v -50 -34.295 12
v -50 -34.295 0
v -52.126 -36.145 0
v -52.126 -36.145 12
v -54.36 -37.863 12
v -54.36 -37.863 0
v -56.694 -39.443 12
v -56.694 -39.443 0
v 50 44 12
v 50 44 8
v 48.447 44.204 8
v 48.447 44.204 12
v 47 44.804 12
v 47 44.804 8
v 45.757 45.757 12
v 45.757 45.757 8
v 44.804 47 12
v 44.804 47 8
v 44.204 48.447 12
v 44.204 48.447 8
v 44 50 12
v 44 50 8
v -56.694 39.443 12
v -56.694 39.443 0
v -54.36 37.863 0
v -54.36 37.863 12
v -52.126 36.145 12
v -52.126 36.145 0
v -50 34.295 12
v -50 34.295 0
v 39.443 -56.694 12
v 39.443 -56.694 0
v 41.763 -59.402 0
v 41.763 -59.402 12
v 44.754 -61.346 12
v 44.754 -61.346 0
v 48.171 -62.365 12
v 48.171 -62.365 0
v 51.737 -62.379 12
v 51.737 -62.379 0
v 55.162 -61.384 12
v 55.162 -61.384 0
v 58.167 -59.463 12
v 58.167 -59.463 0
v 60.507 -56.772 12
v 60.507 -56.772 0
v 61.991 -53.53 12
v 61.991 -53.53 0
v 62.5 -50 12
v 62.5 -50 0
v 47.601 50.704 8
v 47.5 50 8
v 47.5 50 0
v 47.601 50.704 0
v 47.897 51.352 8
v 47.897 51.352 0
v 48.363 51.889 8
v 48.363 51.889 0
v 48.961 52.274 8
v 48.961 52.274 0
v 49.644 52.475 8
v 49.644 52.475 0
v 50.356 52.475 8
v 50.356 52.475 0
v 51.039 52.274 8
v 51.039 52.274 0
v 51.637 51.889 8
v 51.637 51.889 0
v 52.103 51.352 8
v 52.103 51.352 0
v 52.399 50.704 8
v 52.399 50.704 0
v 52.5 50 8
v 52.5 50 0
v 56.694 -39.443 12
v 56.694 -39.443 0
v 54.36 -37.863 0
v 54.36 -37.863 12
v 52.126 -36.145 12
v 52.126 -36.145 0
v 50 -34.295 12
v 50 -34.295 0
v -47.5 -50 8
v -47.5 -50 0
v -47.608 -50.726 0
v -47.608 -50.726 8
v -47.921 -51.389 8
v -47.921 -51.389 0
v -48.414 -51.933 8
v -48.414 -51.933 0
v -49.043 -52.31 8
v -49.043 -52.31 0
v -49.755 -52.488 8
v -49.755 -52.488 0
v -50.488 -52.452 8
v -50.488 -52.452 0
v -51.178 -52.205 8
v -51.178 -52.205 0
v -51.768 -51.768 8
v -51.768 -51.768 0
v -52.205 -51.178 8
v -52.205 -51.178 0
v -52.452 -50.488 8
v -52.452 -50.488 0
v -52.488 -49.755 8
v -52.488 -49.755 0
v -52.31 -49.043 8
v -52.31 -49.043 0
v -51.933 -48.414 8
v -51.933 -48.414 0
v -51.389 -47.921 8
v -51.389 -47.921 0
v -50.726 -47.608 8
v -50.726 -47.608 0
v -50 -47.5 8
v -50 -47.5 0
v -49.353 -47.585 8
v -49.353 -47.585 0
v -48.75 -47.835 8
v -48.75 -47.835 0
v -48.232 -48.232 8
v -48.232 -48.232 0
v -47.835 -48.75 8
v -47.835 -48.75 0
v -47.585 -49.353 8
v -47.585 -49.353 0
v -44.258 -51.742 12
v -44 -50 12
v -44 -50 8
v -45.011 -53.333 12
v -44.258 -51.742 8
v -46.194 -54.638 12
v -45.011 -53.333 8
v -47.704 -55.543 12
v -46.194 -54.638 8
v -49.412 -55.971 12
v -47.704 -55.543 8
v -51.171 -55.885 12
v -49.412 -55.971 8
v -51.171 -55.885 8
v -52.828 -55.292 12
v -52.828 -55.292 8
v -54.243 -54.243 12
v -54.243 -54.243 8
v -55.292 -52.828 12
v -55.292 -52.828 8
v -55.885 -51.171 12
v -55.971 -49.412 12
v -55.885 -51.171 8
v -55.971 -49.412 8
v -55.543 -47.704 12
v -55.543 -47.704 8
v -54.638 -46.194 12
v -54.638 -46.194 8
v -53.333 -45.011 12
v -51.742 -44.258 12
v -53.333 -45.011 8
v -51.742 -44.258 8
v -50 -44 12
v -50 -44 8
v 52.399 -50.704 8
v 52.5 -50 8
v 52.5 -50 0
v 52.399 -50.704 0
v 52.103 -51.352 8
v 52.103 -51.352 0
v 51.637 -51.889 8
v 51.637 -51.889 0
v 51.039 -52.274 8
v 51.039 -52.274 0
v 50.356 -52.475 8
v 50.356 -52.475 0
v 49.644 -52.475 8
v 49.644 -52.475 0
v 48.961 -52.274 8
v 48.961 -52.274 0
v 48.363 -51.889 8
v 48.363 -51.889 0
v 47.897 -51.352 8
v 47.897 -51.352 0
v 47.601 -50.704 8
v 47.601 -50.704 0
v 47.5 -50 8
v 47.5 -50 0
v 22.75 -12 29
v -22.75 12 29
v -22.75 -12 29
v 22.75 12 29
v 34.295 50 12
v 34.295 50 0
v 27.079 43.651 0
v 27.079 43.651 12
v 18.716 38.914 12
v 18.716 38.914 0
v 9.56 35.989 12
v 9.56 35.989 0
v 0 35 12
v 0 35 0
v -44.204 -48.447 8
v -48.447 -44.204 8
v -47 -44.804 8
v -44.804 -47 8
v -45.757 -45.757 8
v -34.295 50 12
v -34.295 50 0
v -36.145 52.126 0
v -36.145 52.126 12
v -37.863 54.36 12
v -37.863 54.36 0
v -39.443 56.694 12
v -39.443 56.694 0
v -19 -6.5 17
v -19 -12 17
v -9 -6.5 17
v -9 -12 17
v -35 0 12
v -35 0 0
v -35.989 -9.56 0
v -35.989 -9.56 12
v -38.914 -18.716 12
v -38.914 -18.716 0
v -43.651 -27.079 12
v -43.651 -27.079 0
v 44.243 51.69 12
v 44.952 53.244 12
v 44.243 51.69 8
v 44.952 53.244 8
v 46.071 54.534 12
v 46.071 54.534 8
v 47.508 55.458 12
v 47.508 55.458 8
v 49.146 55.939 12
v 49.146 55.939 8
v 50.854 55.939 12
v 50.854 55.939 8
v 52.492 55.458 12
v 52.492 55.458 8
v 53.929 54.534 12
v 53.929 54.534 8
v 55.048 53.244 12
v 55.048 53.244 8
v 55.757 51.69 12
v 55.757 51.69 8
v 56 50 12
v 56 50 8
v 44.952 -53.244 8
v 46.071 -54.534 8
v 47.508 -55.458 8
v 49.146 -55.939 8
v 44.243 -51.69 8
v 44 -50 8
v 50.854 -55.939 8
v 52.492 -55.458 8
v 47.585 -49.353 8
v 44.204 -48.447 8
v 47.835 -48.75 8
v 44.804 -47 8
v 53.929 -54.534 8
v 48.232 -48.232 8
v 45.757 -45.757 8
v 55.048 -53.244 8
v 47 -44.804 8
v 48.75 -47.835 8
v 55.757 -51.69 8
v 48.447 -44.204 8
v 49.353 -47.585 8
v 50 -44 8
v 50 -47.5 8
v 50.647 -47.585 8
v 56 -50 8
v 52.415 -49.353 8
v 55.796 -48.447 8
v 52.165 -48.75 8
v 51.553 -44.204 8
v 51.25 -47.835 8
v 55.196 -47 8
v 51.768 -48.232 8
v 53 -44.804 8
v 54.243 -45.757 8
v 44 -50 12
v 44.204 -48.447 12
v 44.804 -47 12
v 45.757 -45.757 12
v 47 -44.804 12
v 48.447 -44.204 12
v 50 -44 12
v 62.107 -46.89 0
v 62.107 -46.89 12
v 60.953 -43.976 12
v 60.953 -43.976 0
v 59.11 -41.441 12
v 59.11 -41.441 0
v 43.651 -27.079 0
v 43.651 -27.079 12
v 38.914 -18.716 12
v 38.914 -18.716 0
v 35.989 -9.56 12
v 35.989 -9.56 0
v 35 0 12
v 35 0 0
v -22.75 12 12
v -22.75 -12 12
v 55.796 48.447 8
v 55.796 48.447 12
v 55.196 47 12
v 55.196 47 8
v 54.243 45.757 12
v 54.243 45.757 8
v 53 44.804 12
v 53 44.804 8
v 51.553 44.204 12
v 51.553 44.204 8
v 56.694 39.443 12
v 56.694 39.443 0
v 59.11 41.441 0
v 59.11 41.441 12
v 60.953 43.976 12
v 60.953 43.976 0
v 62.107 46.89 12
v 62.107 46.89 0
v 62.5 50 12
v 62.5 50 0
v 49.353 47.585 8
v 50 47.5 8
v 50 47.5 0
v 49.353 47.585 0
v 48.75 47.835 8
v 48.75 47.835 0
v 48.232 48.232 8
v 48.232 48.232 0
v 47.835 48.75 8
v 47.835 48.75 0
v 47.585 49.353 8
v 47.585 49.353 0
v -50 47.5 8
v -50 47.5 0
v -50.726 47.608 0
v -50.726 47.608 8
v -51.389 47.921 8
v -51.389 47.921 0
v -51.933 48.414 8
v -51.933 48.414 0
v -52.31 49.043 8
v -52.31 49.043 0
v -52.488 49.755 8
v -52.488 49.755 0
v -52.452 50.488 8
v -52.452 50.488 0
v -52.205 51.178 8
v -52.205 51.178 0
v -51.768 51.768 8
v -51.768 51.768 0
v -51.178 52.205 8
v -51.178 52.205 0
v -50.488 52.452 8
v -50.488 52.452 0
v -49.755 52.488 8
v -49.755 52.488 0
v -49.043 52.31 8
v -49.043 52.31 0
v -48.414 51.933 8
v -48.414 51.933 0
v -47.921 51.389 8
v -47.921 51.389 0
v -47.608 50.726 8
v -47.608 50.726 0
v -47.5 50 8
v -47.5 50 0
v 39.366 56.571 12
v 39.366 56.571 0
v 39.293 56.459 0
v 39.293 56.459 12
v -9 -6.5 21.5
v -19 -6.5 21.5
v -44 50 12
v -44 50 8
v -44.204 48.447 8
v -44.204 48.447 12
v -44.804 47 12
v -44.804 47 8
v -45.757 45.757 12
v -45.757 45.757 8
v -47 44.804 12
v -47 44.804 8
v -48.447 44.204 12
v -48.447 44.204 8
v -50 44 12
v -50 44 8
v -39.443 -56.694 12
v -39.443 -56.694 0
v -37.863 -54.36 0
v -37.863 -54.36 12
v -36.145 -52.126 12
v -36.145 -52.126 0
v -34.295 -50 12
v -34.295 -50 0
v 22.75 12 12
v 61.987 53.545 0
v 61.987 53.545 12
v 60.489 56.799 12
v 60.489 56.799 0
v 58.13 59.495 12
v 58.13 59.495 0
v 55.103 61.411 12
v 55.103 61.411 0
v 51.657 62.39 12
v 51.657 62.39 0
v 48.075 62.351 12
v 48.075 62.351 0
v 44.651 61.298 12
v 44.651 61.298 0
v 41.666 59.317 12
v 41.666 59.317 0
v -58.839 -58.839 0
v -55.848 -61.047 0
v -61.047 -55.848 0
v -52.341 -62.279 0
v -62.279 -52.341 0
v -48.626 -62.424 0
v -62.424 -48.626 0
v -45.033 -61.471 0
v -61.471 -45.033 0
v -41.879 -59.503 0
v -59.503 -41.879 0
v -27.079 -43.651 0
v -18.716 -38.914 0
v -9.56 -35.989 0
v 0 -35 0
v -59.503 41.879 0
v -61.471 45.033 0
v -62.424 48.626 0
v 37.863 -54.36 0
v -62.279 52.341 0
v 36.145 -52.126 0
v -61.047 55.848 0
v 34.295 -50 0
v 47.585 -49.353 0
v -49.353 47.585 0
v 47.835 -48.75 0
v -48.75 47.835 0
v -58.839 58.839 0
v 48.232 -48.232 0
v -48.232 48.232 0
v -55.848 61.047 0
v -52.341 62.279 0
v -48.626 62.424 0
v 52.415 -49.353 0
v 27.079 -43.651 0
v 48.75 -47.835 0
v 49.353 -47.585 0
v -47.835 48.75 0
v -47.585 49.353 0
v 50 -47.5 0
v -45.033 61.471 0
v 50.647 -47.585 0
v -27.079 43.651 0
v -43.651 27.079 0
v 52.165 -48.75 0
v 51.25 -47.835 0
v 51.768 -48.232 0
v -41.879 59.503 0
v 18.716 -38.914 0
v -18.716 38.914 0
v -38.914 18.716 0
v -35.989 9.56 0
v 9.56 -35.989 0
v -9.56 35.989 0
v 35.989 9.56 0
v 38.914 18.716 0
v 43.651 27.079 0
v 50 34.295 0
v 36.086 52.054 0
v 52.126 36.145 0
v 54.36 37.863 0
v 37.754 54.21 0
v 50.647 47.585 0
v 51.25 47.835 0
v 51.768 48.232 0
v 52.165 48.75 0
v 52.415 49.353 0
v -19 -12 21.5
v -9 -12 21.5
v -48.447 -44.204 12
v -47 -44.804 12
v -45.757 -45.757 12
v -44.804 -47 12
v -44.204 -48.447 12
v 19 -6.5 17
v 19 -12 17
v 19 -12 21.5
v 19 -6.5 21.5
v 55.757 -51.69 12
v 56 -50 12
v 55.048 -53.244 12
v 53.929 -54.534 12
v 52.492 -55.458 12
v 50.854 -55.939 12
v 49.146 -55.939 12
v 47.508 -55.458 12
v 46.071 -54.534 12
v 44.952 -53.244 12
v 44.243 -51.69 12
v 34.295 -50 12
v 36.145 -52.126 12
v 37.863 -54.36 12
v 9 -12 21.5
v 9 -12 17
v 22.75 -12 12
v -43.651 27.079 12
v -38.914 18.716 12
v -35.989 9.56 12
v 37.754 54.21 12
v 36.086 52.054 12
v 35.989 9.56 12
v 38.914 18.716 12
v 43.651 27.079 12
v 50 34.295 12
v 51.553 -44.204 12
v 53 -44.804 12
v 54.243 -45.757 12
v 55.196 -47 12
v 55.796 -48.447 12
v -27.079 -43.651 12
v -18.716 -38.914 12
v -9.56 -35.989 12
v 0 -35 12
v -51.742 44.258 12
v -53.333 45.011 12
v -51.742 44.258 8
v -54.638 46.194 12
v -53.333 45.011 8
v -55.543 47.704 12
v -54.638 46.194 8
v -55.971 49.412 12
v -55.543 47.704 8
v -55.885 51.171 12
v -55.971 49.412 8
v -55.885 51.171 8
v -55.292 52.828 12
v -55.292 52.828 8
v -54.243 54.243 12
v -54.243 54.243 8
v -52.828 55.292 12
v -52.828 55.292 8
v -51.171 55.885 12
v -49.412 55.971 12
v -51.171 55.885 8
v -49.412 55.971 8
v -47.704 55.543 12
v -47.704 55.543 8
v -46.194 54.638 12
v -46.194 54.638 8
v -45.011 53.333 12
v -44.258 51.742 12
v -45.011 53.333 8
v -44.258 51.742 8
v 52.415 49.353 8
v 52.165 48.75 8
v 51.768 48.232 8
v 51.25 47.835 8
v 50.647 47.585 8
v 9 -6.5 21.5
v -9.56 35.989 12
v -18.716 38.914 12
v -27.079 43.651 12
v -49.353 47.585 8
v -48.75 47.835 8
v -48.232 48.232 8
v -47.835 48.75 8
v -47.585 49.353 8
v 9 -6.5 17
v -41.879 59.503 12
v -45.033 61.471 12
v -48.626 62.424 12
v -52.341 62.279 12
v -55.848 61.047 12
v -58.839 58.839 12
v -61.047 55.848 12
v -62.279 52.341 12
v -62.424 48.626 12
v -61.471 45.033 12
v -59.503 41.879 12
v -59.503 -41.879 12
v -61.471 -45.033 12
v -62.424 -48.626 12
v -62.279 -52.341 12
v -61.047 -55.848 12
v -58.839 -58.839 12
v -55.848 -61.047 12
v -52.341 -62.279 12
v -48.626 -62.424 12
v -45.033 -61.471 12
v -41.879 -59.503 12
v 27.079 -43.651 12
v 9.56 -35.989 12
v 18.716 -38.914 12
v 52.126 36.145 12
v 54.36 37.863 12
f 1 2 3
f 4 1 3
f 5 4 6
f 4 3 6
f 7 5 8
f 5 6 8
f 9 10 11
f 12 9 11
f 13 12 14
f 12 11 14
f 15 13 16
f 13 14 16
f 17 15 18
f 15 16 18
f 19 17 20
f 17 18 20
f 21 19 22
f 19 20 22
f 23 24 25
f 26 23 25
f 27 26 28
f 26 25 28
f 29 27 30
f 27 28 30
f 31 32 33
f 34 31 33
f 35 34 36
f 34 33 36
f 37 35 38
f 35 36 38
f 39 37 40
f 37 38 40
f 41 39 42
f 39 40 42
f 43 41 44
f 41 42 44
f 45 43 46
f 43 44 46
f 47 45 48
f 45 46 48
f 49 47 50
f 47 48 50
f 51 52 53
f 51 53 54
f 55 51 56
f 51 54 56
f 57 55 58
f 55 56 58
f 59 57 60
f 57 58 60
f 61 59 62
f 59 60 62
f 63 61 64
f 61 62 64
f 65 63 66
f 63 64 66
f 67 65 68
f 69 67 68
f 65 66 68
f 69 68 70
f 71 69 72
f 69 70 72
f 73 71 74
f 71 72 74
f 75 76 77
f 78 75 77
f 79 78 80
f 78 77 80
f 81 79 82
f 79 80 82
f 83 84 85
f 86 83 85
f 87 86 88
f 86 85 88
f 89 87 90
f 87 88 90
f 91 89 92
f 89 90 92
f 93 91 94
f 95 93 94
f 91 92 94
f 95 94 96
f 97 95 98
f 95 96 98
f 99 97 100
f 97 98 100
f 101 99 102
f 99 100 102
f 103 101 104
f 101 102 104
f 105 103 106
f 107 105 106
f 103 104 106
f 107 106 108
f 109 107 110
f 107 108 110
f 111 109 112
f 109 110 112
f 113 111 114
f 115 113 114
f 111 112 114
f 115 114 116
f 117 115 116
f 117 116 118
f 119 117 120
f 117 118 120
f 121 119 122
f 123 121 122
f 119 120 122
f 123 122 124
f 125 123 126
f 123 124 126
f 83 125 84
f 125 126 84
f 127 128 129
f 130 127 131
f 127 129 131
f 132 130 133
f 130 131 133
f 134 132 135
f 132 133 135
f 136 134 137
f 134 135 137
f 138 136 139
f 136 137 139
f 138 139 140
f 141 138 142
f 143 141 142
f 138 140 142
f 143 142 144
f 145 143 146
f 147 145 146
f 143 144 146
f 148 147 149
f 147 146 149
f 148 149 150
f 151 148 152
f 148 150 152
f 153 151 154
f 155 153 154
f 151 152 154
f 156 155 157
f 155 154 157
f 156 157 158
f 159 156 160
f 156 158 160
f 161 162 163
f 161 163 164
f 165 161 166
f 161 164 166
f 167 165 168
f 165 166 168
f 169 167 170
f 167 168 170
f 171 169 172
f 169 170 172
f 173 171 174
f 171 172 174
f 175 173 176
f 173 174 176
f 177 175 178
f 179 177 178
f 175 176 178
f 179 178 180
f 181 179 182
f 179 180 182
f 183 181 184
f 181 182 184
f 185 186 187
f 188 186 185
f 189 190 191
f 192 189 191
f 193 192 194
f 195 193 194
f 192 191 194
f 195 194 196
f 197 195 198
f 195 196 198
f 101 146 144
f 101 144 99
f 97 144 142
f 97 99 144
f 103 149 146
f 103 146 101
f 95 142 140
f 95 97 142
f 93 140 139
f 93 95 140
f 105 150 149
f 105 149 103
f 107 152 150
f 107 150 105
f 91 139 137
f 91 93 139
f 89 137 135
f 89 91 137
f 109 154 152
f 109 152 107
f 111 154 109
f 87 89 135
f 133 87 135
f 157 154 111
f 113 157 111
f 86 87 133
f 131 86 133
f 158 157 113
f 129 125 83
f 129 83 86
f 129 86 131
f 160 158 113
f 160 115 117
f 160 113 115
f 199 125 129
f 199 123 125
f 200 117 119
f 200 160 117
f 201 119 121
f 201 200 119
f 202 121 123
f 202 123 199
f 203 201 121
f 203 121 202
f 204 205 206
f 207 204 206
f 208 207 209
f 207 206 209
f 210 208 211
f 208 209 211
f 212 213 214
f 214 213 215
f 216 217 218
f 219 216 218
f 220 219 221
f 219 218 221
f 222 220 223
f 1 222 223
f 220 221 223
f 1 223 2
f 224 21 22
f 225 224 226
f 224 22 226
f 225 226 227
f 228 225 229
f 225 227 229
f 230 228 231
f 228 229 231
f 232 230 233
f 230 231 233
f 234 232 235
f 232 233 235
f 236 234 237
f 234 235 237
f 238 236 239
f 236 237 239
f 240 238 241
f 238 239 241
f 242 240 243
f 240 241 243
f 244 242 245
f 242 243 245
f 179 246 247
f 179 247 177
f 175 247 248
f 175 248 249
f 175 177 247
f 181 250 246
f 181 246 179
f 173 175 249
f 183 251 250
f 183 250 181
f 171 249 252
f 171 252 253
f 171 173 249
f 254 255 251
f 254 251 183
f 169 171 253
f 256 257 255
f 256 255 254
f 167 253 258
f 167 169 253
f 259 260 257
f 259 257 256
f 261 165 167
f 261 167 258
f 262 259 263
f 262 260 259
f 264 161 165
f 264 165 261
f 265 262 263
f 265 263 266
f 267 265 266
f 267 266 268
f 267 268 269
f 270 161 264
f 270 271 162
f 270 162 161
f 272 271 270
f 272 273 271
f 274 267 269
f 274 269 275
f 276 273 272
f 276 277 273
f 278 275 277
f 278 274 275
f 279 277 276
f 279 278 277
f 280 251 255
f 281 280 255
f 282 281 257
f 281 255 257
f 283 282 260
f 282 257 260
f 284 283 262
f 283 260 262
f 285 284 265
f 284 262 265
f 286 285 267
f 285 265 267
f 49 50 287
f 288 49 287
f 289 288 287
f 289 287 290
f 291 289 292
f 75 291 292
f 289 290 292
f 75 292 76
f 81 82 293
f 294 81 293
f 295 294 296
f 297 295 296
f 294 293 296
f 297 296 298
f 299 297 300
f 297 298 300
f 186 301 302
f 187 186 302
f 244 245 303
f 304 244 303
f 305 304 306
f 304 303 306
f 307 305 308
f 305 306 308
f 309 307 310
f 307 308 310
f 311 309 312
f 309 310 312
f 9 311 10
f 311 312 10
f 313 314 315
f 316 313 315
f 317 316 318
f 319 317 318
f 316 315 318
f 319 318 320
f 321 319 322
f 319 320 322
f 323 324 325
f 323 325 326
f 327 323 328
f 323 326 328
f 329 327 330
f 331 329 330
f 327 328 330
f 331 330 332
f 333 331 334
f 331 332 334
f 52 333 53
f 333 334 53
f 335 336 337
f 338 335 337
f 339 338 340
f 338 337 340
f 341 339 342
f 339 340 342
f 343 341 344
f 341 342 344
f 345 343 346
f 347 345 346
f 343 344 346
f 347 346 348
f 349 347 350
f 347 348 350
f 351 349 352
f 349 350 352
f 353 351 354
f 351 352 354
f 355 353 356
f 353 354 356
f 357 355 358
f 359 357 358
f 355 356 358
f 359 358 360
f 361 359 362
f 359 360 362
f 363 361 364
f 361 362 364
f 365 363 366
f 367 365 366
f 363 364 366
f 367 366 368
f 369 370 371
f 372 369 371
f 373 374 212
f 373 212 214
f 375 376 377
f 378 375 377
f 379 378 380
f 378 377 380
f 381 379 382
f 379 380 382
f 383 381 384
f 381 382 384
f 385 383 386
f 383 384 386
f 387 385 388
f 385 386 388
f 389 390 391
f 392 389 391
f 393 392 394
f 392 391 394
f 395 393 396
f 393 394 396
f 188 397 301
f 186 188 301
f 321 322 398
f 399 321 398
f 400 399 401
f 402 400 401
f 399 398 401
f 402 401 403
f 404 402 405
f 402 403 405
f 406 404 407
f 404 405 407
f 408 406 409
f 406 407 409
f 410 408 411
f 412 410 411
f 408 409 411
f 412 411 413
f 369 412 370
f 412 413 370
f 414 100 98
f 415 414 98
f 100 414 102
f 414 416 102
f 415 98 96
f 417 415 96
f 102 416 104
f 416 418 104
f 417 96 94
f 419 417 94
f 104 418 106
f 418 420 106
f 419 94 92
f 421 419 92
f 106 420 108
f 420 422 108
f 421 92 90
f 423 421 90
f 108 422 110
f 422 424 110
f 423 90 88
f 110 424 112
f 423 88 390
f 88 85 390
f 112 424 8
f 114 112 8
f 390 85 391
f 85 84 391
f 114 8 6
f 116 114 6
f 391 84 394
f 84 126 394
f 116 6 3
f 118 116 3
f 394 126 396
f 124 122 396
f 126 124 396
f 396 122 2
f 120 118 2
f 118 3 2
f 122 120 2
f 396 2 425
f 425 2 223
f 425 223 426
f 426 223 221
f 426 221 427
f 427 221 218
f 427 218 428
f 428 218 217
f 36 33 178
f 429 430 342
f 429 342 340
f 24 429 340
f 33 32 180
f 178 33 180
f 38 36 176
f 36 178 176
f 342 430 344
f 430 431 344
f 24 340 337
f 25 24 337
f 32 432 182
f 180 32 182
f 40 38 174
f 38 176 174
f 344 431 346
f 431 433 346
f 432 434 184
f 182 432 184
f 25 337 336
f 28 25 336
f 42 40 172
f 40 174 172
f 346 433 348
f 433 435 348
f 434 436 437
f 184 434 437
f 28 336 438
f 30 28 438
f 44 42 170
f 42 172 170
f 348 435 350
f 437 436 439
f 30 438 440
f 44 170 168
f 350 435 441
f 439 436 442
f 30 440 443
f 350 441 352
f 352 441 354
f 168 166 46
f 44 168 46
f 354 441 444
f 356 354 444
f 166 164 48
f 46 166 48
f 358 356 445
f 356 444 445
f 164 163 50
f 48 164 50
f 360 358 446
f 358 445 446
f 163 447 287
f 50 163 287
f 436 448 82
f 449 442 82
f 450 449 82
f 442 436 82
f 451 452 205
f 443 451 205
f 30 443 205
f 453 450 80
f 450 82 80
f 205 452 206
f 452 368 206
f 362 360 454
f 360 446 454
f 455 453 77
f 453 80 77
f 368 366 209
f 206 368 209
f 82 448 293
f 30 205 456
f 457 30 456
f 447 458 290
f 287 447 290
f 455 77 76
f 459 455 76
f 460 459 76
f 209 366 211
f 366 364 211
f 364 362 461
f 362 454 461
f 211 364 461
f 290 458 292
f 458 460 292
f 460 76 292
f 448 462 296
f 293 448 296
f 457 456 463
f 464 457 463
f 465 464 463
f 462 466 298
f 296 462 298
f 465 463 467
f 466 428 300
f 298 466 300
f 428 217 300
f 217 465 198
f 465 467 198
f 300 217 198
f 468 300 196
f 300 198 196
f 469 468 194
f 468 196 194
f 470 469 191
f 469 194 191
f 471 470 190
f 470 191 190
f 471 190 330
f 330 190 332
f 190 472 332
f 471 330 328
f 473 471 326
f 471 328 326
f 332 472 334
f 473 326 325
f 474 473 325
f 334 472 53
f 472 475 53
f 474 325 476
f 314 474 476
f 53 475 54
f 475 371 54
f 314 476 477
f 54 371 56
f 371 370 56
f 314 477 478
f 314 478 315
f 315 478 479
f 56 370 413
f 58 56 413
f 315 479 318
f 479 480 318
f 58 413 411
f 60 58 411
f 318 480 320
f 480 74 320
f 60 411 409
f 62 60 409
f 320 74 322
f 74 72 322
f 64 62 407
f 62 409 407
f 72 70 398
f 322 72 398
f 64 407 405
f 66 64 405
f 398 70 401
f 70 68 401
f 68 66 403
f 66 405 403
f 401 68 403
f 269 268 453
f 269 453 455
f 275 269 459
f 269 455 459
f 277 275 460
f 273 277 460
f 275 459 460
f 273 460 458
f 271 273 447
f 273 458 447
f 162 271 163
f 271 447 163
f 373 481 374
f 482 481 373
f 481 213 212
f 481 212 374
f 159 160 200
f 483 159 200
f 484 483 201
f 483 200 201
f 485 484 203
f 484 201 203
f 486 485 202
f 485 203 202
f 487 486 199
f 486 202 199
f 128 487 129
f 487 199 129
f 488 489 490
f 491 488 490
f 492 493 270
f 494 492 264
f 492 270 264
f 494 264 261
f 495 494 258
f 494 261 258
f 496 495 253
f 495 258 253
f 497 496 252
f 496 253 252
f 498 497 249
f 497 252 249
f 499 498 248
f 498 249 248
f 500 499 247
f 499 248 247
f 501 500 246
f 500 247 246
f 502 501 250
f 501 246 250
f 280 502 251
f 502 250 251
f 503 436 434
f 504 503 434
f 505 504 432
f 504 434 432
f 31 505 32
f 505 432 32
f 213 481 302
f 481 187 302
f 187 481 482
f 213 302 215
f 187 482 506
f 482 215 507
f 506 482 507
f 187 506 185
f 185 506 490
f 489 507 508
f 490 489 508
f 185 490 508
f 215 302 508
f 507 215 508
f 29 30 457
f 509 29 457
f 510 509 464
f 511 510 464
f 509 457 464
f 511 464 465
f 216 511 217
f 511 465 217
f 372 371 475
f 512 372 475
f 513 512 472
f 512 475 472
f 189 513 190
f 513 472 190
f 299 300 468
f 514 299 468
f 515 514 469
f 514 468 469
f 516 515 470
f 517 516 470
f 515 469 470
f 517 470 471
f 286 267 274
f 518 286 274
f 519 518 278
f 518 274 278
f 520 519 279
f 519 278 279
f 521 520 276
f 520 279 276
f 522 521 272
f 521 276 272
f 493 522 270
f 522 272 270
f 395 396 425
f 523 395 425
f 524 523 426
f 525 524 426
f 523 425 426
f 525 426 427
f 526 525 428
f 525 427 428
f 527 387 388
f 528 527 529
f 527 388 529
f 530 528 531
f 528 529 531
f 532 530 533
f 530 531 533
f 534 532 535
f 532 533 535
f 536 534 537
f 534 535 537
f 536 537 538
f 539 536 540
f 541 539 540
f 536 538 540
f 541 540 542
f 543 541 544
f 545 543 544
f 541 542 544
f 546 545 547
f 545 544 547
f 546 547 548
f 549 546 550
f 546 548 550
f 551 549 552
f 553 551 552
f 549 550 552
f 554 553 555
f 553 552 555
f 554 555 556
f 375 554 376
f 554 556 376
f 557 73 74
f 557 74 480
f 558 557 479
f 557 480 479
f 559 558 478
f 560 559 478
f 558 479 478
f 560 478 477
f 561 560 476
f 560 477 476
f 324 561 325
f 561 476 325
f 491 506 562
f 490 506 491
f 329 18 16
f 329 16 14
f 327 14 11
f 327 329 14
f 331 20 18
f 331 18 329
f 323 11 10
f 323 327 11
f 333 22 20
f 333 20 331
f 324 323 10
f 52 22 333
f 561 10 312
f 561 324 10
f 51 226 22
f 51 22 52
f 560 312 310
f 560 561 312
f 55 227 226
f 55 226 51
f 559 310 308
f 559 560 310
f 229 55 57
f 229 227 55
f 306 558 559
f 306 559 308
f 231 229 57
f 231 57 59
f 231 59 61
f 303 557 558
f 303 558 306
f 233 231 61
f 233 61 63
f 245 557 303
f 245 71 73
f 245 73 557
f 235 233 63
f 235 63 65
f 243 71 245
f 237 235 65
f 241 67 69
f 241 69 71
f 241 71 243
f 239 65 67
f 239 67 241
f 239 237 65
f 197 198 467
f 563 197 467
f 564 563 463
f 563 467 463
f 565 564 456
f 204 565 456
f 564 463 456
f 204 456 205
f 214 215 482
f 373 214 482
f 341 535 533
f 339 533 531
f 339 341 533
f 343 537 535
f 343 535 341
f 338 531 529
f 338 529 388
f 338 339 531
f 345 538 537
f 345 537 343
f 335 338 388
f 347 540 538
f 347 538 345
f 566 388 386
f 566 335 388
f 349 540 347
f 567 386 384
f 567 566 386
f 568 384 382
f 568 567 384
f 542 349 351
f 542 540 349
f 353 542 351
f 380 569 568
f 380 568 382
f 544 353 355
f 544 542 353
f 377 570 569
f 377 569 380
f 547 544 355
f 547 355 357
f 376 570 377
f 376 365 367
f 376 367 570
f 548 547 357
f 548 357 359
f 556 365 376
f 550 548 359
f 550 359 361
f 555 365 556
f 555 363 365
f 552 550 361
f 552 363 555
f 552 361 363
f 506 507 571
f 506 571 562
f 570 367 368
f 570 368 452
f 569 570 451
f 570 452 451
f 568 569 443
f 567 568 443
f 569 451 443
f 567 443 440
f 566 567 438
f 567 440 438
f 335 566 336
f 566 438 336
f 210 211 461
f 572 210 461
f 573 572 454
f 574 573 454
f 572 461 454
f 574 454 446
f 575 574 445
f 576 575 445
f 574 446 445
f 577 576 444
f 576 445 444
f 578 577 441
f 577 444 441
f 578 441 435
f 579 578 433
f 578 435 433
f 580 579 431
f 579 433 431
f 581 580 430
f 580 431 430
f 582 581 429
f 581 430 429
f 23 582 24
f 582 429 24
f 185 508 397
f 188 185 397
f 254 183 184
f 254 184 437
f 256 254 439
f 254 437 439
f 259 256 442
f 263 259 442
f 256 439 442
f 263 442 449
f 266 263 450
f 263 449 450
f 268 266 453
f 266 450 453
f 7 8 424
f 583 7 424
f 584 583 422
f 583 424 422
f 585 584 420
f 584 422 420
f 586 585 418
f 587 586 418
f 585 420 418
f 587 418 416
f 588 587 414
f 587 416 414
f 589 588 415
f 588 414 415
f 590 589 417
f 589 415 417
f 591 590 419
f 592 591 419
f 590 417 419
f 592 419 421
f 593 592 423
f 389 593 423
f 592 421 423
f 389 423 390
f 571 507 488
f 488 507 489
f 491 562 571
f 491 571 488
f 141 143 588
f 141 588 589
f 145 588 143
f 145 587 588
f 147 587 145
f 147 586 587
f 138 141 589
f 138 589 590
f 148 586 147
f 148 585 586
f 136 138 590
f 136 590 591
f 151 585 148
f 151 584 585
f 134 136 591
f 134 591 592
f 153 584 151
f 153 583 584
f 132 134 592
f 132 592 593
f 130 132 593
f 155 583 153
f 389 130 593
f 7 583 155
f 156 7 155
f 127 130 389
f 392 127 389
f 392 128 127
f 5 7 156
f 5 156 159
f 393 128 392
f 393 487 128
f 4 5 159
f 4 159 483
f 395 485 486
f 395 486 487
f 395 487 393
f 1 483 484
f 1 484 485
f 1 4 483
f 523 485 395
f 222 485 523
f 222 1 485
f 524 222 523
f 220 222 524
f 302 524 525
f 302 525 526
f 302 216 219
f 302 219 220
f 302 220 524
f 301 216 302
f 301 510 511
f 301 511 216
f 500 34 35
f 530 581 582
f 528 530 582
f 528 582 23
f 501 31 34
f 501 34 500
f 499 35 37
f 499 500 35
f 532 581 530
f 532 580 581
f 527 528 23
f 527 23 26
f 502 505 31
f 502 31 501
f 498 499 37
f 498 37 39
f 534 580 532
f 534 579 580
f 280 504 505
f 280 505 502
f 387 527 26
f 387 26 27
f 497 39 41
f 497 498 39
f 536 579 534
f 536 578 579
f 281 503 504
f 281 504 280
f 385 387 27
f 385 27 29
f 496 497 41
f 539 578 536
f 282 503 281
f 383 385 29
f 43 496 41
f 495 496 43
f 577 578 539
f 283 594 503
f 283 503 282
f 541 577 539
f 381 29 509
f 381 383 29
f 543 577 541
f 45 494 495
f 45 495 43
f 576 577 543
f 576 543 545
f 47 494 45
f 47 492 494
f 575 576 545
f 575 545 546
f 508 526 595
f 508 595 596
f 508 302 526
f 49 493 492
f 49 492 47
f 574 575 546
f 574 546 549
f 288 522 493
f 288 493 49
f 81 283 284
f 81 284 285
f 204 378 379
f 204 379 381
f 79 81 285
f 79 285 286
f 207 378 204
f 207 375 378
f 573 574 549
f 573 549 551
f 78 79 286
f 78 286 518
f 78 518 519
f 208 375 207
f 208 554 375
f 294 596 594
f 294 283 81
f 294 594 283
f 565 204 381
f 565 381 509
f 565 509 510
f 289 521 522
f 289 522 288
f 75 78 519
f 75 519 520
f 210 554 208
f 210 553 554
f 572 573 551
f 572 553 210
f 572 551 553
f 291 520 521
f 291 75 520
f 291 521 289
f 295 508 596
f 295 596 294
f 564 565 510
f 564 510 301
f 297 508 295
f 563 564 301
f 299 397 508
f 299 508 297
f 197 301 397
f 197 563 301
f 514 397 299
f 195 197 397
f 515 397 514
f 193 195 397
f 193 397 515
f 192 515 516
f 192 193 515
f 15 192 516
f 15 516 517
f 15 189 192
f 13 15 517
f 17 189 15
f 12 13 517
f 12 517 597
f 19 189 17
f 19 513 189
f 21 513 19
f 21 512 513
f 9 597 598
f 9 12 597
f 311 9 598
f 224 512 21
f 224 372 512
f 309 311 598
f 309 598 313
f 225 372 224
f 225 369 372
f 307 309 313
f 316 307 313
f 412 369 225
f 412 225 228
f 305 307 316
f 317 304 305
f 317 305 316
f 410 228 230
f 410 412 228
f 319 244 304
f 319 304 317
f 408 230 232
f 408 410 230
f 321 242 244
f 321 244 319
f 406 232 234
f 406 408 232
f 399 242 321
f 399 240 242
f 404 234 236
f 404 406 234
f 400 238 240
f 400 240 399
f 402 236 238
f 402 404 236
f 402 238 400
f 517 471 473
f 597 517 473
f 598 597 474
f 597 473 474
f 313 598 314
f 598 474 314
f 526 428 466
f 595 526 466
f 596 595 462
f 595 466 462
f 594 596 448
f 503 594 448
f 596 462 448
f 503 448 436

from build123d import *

# Parameters (mm, degrees)
F1_DEPTH = 12
F0_W     = 22.75
F0_H     = 12
F2_DEPTH = 29
F3_DEPTH = 8
F4_W     = 10
F4_H     = 4.5
F5_DEPTH = 5.5


with BuildPart() as f1:
    # F0 (on Top) → F1 (new body)
    with BuildSketch(Plane.XY):
        with BuildLine():
            Line((37.5, -50), (34.2948445635, -50))
            ThreePointArc((34.2948445635, -50), (37.0207144417, -53.2303243355), (39.4433779545, -56.6938577061))
            ThreePointArc((39.4433779545, -56.6938577061), (37.9956721228, -53.4851272883), (37.5, -50))
        make_face()
        with BuildLine():
            Line((-34.2948445635, -50), (-37.5, -50))
            ThreePointArc((-37.5, -50), (-37.9956721876, -53.4851275115), (-39.4433782034, -56.6938580986))
            ThreePointArc((-39.4433782034, -56.6938580986), (-37.0207145834, -53.2303245197), (-34.2948445635, -50))
        make_face()
        with BuildLine():
            ThreePointArc((-39.443378119, 56.6938579655), (-37.9956721656, 53.4851274358), (-37.5, 50))
            Line((-37.5, 50), (-34.2948445635, 50))
            ThreePointArc((-34.2948445635, 50), (-37.0207145354, 53.2303244572), (-39.443378119, 56.6938579655))
        make_face()
        with BuildLine():
            Line((50, -34.2948445635), (50, -37.5))
            ThreePointArc((50, -37.5), (53.4851274351, -37.9956721654), (56.6938579643, -39.4433781183))
            ThreePointArc((56.6938579643, -39.4433781183), (53.2303244566, -37.020714535), (50, -34.2948445635))
        make_face()
        with BuildLine():
            Line((50, 37.5), (50, 34.2948445635))
            ThreePointArc((50, 34.2948445635), (53.2303242081, 37.0207143438), (56.6938574347, 39.4433777825))
            ThreePointArc((56.6938574347, 39.4433777825), (53.485127134, 37.995672078), (50, 37.5))
        make_face()
        with BuildLine():
            ThreePointArc((-56.6938576889, -39.4433779436), (-53.4851272786, -37.9956721199), (-50, -37.5))
            Line((-50, -37.5), (-50, -34.2948445635))
            ThreePointArc((-50, -34.2948445635), (-53.2303243274, -37.0207144356), (-56.6938576889, -39.4433779436))
        make_face()
        with BuildLine():
            ThreePointArc((-56.6938579169, 39.4433780882), (-53.2303244344, 37.0207145179), (-50, 34.2948445635))
            Line((-50, 34.2948445635), (-50, 37.5))
            ThreePointArc((-50, 37.5), (-53.4851274082, 37.9956721576), (-56.6938579169, 39.4433780882))
        make_face()
        with BuildLine():
            ThreePointArc((37.5, 50), (41.1611652352, 41.1611652352), (50, 37.5))
            Line((50, 37.5), (50, 44))
            ThreePointArc((50, 44), (45.7573593129, 45.7573593129), (44, 50))
            Line((44, 50), (37.5, 50))
        make_face()
        with BuildLine():
            Line((50, 44), (50, 37.5))
            ThreePointArc((50, 37.5), (53.485127134, 37.995672078), (56.6938574347, 39.4433777825))
            ThreePointArc((56.6938574347, 39.4433777825), (60.952698707, 43.9760153525), (62.5, 50))
            ThreePointArc((62.5, 50), (53.4152371074, 62.0243983426), (39.3662151199, 56.5705874261))
            ThreePointArc((39.3662151199, 56.5705874261), (37.9756016574, 53.4152371074), (37.5, 50))
            Line((37.5, 50), (44, 50))
            ThreePointArc((44, 50), (50, 56), (56, 50))
            ThreePointArc((56, 50), (54.2426406871, 45.7573593129), (50, 44))
        make_face()
        with BuildLine():
            Line((44, -50), (37.5, -50))
            ThreePointArc((37.5, -50), (37.9956721228, -53.4851272883), (39.4433779545, -56.6938577061))
            ThreePointArc((39.4433779545, -56.6938577061), (53.4851272883, -62.0043278772), (62.5, -50))
            ThreePointArc((62.5, -50), (60.9526988581, -43.9760156272), (56.6938579643, -39.4433781183))
            ThreePointArc((56.6938579643, -39.4433781183), (53.4851274351, -37.9956721654), (50, -37.5))
            Line((50, -37.5), (50, -44))
            ThreePointArc((50, -44), (54.2426406871, -45.7573593129), (56, -50))
            ThreePointArc((56, -50), (50, -56), (44, -50))
        make_face()
        with BuildLine():
            ThreePointArc((-39.4433782034, -56.6938580986), (-37.9956721876, -53.4851275115), (-37.5, -50))
            Line((-37.5, -50), (-44, -50))
            ThreePointArc((-44, -50), (-54.2426406871, -54.2426406871), (-50, -44))
            Line((-50, -44), (-50, -37.5))
            ThreePointArc((-50, -37.5), (-53.4851272786, -37.9956721199), (-56.6938576889, -39.4433779436))
            ThreePointArc((-56.6938576889, -39.4433779436), (-58.8388349363, -58.8388345933), (-39.4433782034, -56.6938580986))
        make_face()
        with BuildLine():
            ThreePointArc((-56.6938579169, 39.4433780882), (-53.4851274082, 37.9956721576), (-50, 37.5))
            Line((-50, 37.5), (-50, 44))
            ThreePointArc((-50, 44), (-54.2426406871, 54.2426406871), (-44, 50))
            Line((-44, 50), (-37.5, 50))
            ThreePointArc((-37.5, 50), (-37.9956721656, 53.4851274358), (-39.443378119, 56.6938579655))
            ThreePointArc((-39.443378119, 56.6938579655), (-58.8388347851, 58.8388347445), (-56.6938579169, 39.4433780882))
        make_face()
        with BuildLine():
            Line((22.75, 12), (22.75, 0))
            Line((22.75, 0), (35, 0))
            ThreePointArc((35, 0), (38.9140035649, 18.7158780427), (50, 34.2948445635))
            Line((50, 34.2948445635), (50, 37.5))
            ThreePointArc((50, 37.5), (41.1611652352, 41.1611652352), (37.5, 50))
            Line((37.5, 50), (34.2948445635, 50))
            ThreePointArc((34.2948445635, 50), (18.7158780427, 38.9140035649), (0, 35))
            Line((0, 35), (0, 12))
            Line((0, 12), (22.75, 12))
        make_face()
        with BuildLine():
            ThreePointArc((0, -35), (18.7158780427, -38.9140035649), (34.2948445635, -50))
            Line((34.2948445635, -50), (37.5, -50))
            ThreePointArc((37.5, -50), (41.1611652352, -41.1611652352), (50, -37.5))
            Line((50, -37.5), (50, -34.2948445635))
            ThreePointArc((50, -34.2948445635), (38.9140035649, -18.7158780427), (35, 0))
            Line((35, 0), (22.75, 0))
            Line((22.75, 0), (22.75, -12))
            Line((22.75, -12), (0, -12))
            Line((0, -12), (0, -35))
        make_face()
        with BuildLine():
            ThreePointArc((-50, -37.5), (-41.1611652352, -41.1611652352), (-37.5, -50))
            Line((-37.5, -50), (-34.2948445635, -50))
            ThreePointArc((-34.2948445635, -50), (-18.7158780427, -38.9140035649), (0, -35))
            Line((0, -35), (0, -12))
            Line((0, -12), (-22.75, -12))
            Line((-22.75, -12), (-22.75, 0))
            Line((-22.75, 0), (-35, 0))
            ThreePointArc((-35, 0), (-38.9140035649, -18.7158780427), (-50, -34.2948445635))
            Line((-50, -34.2948445635), (-50, -37.5))
        make_face()
        with BuildLine():
            Line((-50, 37.5), (-50, 34.2948445635))
            ThreePointArc((-50, 34.2948445635), (-38.9140035649, 18.7158780427), (-35, 0))
            Line((-35, 0), (-22.75, 0))
            Line((-22.75, 0), (-22.75, 12))
            Line((-22.75, 12), (0, 12))
            Line((0, 12), (0, 35))
            ThreePointArc((0, 35), (-18.7158780427, 38.9140035649), (-34.2948445635, 50))
            Line((-34.2948445635, 50), (-37.5, 50))
            ThreePointArc((-37.5, 50), (-41.1611652352, 41.1611652352), (-50, 37.5))
        make_face()
        with BuildLine():
            Line((-44, -50), (-37.5, -50))
            ThreePointArc((-37.5, -50), (-41.1611652352, -41.1611652352), (-50, -37.5))
            Line((-50, -37.5), (-50, -44))
            ThreePointArc((-50, -44), (-45.7573593129, -45.7573593129), (-44, -50))
        make_face()
        with BuildLine():
            Line((-50, 44), (-50, 37.5))
            ThreePointArc((-50, 37.5), (-41.1611652352, 41.1611652352), (-37.5, 50))
            Line((-37.5, 50), (-44, 50))
            ThreePointArc((-44, 50), (-45.7573593129, 45.7573593129), (-50, 44))
        make_face()
        with BuildLine():
            ThreePointArc((50, -37.5), (41.1611652352, -41.1611652352), (37.5, -50))
            Line((37.5, -50), (44, -50))
            ThreePointArc((44, -50), (45.7573593129, -45.7573593129), (50, -44))
            Line((50, -44), (50, -37.5))
        make_face()
        with BuildLine():
            ThreePointArc((39.2932775844, 56.4586962355), (36.935506218, 53.1198826695), (34.2948445635, 50))
            Line((34.2948445635, 50), (37.5, 50))
            ThreePointArc((37.5, 50), (37.9756016574, 53.4152371074), (39.3662151199, 56.5705874261))
            Line((39.3662151199, 56.5705874261), (39.2932775844, 56.4586962355))
        make_face()
    extrude(amount=F1_DEPTH)

    # F0 (on Top) → F2 (join)
    with BuildSketch(Plane.XY):
        with Locations((-11.375, 6)):
            Rectangle(F0_W, F0_H)
        with Locations((11.375, 6)):
            Rectangle(F0_W, F0_H)
        with Locations((11.375, -6)):
            Rectangle(F0_W, F0_H)
        with Locations((-11.375, -6)):
            Rectangle(F0_W, F0_H)
    extrude(amount=F2_DEPTH)

    # F0 (on Top) → F3 (join)
    with BuildSketch(Plane.XY):
        with BuildLine():
            ThreePointArc((-44, 50), (-54.2426406871, 54.2426406871), (-50, 44))
            Line((-50, 44), (-50, 47.5))
            ThreePointArc((-50, 47.5), (-51.767766953, 51.767766953), (-47.5, 50))
            Line((-47.5, 50), (-44, 50))
        make_face()
        with BuildLine():
            Line((-50, 47.5), (-50, 44))
            ThreePointArc((-50, 44), (-45.7573593129, 45.7573593129), (-44, 50))
            Line((-44, 50), (-47.5, 50))
            ThreePointArc((-47.5, 50), (-48.232233047, 48.232233047), (-50, 47.5))
        make_face()
        with BuildLine():
            Line((50, 47.5), (50, 44))
            ThreePointArc((50, 44), (54.2426406871, 45.7573593129), (56, 50))
            ThreePointArc((56, 50), (50, 56), (44, 50))
            Line((44, 50), (47.5, 50))
            ThreePointArc((47.5, 50), (50, 52.5), (52.5, 50))
            ThreePointArc((52.5, 50), (51.767766953, 48.232233047), (50, 47.5))
        make_face()
        with BuildLine():
            ThreePointArc((44, 50), (45.7573593129, 45.7573593129), (50, 44))
            Line((50, 44), (50, 47.5))
            ThreePointArc((50, 47.5), (48.232233047, 48.232233047), (47.5, 50))
            Line((47.5, 50), (44, 50))
        make_face()
        with BuildLine():
            ThreePointArc((50, -44), (45.7573593129, -45.7573593129), (44, -50))
            Line((44, -50), (47.5, -50))
            ThreePointArc((47.5, -50), (48.232233047, -48.232233047), (50, -47.5))
            Line((50, -47.5), (50, -44))
        make_face()
        with BuildLine():
            Line((47.5, -50), (44, -50))
            ThreePointArc((44, -50), (50, -56), (56, -50))
            ThreePointArc((56, -50), (54.2426406871, -45.7573593129), (50, -44))
            Line((50, -44), (50, -47.5))
            ThreePointArc((50, -47.5), (51.767766953, -48.232233047), (52.5, -50))
            ThreePointArc((52.5, -50), (50, -52.5), (47.5, -50))
        make_face()
        with BuildLine():
            Line((-47.5, -50), (-44, -50))
            ThreePointArc((-44, -50), (-45.7573593129, -45.7573593129), (-50, -44))
            Line((-50, -44), (-50, -47.5))
            ThreePointArc((-50, -47.5), (-48.232233047, -48.232233047), (-47.5, -50))
        make_face()
        with BuildLine():
            ThreePointArc((-50, -44), (-54.2426406871, -54.2426406871), (-44, -50))
            Line((-44, -50), (-47.5, -50))
            ThreePointArc((-47.5, -50), (-51.767766953, -51.767766953), (-50, -47.5))
            Line((-50, -47.5), (-50, -44))
        make_face()
    extrude(amount=F3_DEPTH)

    # F4 (on face) → F5 (cut)
    with BuildSketch(Plane.XZ.offset(12)):
        with Locations((-14, 19.25)):
            Rectangle(F4_W, F4_H)
        with Locations((14, 19.25)):
            Rectangle(F4_W, F4_H)
    extrude(amount=-F5_DEPTH, mode=Mode.SUBTRACT)


solid = f1.part
